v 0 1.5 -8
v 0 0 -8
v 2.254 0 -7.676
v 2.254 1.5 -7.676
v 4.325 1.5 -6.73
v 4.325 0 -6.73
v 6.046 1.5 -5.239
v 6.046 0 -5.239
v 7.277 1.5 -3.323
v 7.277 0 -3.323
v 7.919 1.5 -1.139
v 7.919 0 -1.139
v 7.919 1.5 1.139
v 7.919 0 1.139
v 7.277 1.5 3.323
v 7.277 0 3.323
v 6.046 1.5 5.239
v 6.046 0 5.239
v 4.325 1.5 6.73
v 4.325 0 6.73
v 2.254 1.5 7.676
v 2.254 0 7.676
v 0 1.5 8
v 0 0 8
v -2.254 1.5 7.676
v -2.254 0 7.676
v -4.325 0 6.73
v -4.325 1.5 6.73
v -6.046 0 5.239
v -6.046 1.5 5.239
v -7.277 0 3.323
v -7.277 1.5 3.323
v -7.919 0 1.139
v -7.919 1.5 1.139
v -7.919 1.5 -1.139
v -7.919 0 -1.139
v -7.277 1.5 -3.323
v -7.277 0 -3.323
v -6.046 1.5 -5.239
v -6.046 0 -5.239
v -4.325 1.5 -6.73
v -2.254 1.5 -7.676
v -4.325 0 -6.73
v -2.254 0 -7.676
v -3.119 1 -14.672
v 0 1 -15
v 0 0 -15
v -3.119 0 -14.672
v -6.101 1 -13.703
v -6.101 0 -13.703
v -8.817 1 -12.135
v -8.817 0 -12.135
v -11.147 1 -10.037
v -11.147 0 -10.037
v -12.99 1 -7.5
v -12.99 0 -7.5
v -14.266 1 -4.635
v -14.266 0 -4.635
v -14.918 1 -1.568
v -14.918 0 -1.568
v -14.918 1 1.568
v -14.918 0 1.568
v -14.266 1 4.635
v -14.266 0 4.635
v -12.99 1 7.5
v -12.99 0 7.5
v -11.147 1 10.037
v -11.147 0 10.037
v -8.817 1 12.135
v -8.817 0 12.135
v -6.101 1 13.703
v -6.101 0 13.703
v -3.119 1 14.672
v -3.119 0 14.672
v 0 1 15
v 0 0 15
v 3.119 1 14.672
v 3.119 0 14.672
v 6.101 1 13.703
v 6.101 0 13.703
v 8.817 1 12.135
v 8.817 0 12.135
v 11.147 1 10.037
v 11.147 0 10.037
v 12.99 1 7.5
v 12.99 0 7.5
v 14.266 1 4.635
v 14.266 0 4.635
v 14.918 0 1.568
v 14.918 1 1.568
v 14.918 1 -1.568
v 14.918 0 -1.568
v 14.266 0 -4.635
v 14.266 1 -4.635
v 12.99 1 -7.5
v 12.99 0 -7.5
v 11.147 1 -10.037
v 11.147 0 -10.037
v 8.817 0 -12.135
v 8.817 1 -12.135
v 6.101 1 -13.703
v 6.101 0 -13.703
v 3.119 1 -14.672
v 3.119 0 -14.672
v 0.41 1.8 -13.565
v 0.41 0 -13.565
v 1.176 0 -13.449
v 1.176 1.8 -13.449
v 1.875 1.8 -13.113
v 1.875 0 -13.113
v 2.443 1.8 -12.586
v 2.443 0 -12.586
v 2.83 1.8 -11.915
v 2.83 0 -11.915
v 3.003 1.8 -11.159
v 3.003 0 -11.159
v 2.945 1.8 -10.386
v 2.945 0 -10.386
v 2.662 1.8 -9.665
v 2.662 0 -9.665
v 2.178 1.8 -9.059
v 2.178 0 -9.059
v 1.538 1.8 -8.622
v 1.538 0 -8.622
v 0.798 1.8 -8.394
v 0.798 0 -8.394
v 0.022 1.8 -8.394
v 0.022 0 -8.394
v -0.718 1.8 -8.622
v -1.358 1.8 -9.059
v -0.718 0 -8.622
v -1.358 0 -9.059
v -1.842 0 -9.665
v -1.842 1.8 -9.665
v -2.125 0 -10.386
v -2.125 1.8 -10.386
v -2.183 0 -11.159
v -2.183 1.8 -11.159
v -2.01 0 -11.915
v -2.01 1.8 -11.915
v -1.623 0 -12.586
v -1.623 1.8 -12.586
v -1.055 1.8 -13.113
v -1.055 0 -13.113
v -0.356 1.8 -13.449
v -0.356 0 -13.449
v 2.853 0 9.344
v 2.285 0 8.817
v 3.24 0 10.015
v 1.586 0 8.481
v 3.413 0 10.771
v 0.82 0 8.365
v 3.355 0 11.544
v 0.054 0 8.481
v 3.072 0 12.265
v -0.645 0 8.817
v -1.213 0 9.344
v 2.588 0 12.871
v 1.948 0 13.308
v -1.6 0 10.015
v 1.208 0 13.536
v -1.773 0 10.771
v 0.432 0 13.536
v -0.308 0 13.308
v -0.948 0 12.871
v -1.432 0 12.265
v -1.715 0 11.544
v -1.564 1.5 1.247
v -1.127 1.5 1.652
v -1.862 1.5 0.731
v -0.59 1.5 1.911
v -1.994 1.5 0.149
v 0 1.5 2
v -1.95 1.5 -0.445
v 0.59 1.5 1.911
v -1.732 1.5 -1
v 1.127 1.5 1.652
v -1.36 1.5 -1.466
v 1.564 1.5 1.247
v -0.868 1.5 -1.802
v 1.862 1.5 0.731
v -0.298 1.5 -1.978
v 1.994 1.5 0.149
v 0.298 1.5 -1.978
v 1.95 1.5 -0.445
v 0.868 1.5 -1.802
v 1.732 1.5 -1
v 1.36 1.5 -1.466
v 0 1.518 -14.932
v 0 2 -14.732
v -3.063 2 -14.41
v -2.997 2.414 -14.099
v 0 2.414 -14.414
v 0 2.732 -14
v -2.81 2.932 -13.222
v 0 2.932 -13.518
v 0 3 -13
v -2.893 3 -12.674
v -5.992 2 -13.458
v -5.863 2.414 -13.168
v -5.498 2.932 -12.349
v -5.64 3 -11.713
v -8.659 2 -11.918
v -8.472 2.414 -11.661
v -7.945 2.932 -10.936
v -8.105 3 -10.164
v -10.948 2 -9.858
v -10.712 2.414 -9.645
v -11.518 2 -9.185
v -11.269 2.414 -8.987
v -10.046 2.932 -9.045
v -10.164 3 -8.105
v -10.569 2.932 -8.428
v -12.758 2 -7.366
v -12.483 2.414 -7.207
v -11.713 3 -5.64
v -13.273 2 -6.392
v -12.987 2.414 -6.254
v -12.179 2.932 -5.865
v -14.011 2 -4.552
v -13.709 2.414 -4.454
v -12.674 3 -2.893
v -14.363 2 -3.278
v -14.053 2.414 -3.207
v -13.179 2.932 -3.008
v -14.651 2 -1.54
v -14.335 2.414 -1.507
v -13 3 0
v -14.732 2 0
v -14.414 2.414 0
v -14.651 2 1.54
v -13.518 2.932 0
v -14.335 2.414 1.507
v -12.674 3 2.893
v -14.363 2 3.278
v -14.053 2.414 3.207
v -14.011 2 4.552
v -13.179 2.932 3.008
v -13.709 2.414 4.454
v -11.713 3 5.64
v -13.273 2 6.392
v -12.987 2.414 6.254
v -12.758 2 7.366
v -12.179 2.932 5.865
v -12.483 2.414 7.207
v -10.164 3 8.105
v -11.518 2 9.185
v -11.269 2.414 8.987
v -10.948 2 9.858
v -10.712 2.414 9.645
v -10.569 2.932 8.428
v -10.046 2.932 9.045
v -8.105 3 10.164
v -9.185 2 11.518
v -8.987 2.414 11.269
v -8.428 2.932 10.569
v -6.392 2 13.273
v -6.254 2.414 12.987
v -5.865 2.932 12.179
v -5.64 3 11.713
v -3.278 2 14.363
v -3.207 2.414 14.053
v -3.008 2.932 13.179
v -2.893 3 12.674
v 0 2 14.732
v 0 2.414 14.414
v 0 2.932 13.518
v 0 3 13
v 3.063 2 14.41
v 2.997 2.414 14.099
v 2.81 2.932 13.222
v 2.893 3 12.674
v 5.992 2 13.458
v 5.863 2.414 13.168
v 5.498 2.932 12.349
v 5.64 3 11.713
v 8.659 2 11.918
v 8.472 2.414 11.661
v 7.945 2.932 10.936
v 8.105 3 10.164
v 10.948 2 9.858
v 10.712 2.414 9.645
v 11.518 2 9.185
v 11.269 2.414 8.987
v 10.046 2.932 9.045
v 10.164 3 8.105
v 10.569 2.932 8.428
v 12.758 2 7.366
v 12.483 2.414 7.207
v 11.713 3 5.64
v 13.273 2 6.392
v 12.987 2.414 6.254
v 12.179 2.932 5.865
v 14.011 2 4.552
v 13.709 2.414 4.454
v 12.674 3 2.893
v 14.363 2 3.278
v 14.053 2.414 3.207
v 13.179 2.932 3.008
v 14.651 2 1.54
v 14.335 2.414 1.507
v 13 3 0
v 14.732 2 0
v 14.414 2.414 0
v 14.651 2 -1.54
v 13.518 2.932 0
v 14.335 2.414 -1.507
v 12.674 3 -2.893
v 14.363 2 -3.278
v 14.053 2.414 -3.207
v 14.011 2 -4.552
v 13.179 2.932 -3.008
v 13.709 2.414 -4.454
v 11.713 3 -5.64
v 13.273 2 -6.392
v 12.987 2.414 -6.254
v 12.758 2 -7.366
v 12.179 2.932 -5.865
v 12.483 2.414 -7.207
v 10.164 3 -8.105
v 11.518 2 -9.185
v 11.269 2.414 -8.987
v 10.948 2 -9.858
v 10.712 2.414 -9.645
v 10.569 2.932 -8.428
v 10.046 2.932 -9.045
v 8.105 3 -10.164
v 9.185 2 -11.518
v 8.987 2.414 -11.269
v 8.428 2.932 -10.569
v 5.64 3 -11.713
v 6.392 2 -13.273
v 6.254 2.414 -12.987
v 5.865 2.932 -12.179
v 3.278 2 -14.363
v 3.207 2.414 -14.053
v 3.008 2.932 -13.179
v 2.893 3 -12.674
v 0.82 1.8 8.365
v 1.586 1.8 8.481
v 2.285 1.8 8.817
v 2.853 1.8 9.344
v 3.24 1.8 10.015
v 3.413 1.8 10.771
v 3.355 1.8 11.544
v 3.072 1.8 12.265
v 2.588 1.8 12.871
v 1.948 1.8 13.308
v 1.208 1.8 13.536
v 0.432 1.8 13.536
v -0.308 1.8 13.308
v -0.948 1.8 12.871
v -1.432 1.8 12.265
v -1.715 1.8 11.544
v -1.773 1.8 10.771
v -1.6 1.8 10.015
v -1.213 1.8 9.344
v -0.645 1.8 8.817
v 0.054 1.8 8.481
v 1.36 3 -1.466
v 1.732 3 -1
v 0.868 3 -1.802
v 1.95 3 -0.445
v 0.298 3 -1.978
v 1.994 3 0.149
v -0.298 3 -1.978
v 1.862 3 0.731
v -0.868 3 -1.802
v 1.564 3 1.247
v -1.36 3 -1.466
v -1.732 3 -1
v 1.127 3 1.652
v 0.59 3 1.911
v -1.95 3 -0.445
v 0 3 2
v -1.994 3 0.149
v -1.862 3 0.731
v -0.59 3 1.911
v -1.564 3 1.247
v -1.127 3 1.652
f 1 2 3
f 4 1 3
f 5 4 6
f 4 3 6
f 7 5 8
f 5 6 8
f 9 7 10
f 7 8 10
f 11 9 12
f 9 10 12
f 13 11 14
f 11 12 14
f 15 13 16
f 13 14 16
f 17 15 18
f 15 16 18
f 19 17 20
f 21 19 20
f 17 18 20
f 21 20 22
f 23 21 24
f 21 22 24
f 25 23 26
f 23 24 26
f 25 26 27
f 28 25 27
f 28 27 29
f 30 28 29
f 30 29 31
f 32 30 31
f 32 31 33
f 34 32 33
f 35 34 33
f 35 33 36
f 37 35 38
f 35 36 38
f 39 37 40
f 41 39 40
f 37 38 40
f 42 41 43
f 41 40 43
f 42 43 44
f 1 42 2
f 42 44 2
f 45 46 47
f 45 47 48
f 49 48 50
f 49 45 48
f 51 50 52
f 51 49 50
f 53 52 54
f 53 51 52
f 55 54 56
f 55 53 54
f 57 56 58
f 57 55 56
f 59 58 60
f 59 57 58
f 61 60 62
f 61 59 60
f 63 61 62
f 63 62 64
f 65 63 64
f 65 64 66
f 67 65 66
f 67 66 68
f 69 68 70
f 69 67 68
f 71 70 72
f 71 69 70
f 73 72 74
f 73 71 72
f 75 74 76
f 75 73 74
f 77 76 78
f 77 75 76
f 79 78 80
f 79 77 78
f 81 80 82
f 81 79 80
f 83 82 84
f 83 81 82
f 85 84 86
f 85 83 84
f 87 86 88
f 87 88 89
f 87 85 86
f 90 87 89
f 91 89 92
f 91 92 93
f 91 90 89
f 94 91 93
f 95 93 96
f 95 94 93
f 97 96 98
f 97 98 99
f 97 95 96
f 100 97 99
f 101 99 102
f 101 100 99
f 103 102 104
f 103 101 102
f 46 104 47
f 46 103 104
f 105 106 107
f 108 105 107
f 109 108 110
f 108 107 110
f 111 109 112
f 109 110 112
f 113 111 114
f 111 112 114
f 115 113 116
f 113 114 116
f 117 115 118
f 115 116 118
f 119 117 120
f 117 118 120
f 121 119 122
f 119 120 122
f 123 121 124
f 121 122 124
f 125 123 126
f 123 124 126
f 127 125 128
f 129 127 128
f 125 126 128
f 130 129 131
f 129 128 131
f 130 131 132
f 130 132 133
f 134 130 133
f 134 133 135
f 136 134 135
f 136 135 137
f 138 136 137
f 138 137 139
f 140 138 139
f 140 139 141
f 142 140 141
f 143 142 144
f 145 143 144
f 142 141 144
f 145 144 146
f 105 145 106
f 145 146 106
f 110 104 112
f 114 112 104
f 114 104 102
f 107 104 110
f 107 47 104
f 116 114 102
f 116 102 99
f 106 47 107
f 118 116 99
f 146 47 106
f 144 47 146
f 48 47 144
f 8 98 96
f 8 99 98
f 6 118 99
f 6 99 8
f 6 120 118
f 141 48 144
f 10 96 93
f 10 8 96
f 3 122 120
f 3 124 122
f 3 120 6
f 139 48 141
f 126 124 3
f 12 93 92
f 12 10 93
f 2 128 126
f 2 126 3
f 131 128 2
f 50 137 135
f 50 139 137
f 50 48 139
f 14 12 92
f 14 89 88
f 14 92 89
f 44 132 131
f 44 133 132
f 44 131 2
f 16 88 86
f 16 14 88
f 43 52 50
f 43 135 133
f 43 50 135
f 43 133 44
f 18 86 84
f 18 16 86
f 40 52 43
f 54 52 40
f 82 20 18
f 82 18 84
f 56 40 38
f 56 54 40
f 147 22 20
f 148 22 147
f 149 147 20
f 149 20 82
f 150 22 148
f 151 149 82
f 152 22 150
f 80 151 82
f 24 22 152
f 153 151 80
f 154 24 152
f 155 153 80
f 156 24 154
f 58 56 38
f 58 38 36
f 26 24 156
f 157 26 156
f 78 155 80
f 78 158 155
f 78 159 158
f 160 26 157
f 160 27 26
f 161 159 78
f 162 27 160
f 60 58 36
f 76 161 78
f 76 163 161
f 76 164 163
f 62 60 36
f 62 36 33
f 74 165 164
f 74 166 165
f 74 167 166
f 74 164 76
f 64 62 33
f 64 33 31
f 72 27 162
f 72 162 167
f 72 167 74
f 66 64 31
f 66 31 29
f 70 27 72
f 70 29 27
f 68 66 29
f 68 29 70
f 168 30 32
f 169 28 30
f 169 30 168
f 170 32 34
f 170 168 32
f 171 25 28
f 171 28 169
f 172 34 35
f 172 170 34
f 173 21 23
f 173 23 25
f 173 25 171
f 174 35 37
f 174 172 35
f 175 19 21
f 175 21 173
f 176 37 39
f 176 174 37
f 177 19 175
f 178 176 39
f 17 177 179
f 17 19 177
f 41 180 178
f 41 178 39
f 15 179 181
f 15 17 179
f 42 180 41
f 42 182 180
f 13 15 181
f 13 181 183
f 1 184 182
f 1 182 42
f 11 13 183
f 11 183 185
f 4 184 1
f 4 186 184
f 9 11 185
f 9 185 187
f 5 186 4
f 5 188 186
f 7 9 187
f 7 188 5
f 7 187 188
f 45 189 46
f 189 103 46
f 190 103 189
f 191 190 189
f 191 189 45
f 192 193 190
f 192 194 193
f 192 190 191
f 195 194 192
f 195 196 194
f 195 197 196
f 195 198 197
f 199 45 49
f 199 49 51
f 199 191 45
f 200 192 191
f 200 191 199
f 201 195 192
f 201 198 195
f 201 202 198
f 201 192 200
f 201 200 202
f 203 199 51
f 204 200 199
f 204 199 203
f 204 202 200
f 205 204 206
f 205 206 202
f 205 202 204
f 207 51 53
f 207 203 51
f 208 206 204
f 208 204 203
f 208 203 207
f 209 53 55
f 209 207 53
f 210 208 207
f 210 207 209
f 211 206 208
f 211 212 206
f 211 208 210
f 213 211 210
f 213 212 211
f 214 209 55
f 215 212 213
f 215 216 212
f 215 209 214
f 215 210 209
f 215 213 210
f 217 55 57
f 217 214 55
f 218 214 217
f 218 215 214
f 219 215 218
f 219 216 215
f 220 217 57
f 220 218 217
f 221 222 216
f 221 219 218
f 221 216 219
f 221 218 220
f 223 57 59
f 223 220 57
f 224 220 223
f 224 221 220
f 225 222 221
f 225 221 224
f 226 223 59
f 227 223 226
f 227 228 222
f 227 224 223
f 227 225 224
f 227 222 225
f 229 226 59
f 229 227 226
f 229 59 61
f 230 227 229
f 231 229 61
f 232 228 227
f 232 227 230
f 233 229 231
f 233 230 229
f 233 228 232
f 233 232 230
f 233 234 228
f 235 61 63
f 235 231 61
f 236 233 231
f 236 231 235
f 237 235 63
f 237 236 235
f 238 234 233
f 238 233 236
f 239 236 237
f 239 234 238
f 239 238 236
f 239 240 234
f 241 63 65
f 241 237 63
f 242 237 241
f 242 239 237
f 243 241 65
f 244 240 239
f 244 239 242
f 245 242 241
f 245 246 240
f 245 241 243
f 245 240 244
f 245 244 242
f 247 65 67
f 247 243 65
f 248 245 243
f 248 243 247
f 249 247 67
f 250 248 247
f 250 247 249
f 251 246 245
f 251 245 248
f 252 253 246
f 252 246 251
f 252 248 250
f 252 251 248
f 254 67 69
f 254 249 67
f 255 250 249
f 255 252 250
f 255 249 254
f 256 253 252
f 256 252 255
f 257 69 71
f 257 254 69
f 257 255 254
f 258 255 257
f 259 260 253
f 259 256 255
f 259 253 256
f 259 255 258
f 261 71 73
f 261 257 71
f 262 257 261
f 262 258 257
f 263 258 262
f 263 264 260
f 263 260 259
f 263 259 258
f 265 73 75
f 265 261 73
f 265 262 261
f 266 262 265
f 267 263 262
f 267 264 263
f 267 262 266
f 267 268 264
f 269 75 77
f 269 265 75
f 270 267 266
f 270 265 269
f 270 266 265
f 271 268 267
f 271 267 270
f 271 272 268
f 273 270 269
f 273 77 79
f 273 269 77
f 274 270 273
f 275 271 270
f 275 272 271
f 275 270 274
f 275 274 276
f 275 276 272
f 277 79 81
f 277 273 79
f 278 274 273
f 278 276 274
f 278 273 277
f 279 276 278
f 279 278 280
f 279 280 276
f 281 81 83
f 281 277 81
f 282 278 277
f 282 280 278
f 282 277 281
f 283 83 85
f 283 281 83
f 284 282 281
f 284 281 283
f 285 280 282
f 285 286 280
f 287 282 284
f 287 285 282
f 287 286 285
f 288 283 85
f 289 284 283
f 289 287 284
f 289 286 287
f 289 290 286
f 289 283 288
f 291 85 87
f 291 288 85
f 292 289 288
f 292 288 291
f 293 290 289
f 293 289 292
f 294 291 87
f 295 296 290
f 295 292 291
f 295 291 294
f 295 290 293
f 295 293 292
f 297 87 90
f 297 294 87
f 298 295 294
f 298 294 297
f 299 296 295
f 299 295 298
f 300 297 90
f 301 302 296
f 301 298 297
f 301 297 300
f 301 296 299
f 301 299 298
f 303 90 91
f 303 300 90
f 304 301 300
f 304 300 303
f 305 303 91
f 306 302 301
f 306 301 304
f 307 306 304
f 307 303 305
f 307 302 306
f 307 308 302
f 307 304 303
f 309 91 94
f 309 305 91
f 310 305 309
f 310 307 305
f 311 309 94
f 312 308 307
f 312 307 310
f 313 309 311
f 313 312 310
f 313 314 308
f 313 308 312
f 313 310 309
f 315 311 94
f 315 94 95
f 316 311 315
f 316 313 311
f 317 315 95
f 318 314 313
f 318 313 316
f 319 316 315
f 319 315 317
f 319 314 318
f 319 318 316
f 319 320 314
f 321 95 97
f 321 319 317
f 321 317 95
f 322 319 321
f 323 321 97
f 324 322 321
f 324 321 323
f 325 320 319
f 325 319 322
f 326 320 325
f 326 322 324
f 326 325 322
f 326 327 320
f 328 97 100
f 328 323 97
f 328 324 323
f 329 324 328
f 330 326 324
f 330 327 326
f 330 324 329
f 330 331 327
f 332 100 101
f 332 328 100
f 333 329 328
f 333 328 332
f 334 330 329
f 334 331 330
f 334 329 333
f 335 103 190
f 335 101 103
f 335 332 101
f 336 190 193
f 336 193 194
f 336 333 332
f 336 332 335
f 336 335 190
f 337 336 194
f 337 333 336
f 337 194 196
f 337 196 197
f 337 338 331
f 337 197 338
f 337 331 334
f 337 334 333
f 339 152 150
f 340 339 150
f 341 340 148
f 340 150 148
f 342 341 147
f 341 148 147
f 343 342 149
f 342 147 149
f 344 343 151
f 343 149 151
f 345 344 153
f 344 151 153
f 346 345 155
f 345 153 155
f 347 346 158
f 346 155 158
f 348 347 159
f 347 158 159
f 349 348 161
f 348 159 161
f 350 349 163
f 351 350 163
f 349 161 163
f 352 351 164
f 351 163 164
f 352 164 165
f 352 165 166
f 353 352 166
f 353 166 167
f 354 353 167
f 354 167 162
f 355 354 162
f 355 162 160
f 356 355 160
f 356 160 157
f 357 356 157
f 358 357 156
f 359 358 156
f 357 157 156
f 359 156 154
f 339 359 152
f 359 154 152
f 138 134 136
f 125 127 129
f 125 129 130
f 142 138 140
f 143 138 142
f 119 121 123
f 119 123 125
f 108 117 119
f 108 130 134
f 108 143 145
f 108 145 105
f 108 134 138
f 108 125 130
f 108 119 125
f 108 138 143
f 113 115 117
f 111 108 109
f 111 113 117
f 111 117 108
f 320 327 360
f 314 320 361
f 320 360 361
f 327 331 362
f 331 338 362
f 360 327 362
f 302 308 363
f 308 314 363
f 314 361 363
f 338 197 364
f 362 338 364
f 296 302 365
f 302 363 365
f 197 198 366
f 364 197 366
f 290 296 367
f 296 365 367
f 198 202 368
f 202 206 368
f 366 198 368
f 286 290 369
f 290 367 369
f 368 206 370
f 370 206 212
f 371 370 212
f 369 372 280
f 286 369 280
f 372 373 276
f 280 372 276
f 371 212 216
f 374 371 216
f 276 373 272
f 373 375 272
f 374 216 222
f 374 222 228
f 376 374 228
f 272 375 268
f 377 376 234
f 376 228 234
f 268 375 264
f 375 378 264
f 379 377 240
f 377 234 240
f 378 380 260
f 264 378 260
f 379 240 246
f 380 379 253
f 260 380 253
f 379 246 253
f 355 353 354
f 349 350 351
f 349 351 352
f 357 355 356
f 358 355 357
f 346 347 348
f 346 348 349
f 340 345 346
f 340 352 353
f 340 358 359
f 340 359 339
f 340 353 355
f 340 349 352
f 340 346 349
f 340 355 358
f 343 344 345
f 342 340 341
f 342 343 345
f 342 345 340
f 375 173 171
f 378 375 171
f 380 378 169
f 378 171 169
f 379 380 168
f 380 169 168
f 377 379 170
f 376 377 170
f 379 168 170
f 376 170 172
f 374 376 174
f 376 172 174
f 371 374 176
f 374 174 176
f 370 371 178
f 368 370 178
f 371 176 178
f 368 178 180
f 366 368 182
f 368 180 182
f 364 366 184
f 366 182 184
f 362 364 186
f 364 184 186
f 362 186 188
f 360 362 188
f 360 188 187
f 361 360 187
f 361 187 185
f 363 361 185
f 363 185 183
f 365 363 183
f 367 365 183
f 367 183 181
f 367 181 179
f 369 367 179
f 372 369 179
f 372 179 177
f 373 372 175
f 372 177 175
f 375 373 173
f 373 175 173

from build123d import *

# Parameters (mm, degrees)
SKETCH2_W          = 15
SKETCH2_H          = 3
SKETCH3_R          = 8
CUT_EXTRUDE1_DEPTH = 1.5
CUT_EXTRUDE2_DEPTH = 1.5
SKETCH5_R          = 2.6
CUT_EXTRUDE3_DEPTH = 1.8
FILLET1_R          = 2


with BuildPart() as part:
    # Sketch2 → Revolve1 (revolve)
    with BuildSketch(Plane.XY, mode=Mode.PRIVATE) as revolve1_sk:
        with Locations((7.5, 1.5)):
            Rectangle(SKETCH2_W, SKETCH2_H)
    revolve(revolve1_sk.sketch.rotate(Axis((0, 0, 0), (0, 1, 0)), 90), axis=Axis((0, 0, 0), (0, 1, 0)))

    # Sketch3 → Cut-Extrude1 (cut)
    with BuildSketch(Plane.XZ):
        with Locations(Location((0, 0, 0), (0, 0, 270))):
            Circle(SKETCH3_R)
    extrude(amount=-CUT_EXTRUDE1_DEPTH, mode=Mode.SUBTRACT)

    # Sketch4 → Cut-Extrude2 (cut)
    with BuildSketch(Plane.XZ.offset(-1.5)):
        with BuildLine():
            ThreePointArc((0, -2), (2, 0), (0, 2))
            ThreePointArc((0, 2), (-2, 0), (0, -2))
        make_face()
    extrude(amount=-CUT_EXTRUDE2_DEPTH, mode=Mode.SUBTRACT)

    # Sketch5 → Cut-Extrude3 (cut)
    with BuildSketch(Plane.XZ):
        with Locations(Location((0.41, -10.964999997, 0), (0, 0, 270))):
            Circle(SKETCH5_R)
        with Locations(Location((0.82, 10.965000003, 0), (0, 0, 270))):
            Circle(SKETCH5_R)
    extrude(amount=-CUT_EXTRUDE3_DEPTH, mode=Mode.SUBTRACT)

    # Fillet1
    fillet1_edges = [part.edges().sort_by_distance(p)[0] for p in [
        (0, 3, 15),
    ]]
    fillet(fillet1_edges, radius=FILLET1_R)


solid = part.part
